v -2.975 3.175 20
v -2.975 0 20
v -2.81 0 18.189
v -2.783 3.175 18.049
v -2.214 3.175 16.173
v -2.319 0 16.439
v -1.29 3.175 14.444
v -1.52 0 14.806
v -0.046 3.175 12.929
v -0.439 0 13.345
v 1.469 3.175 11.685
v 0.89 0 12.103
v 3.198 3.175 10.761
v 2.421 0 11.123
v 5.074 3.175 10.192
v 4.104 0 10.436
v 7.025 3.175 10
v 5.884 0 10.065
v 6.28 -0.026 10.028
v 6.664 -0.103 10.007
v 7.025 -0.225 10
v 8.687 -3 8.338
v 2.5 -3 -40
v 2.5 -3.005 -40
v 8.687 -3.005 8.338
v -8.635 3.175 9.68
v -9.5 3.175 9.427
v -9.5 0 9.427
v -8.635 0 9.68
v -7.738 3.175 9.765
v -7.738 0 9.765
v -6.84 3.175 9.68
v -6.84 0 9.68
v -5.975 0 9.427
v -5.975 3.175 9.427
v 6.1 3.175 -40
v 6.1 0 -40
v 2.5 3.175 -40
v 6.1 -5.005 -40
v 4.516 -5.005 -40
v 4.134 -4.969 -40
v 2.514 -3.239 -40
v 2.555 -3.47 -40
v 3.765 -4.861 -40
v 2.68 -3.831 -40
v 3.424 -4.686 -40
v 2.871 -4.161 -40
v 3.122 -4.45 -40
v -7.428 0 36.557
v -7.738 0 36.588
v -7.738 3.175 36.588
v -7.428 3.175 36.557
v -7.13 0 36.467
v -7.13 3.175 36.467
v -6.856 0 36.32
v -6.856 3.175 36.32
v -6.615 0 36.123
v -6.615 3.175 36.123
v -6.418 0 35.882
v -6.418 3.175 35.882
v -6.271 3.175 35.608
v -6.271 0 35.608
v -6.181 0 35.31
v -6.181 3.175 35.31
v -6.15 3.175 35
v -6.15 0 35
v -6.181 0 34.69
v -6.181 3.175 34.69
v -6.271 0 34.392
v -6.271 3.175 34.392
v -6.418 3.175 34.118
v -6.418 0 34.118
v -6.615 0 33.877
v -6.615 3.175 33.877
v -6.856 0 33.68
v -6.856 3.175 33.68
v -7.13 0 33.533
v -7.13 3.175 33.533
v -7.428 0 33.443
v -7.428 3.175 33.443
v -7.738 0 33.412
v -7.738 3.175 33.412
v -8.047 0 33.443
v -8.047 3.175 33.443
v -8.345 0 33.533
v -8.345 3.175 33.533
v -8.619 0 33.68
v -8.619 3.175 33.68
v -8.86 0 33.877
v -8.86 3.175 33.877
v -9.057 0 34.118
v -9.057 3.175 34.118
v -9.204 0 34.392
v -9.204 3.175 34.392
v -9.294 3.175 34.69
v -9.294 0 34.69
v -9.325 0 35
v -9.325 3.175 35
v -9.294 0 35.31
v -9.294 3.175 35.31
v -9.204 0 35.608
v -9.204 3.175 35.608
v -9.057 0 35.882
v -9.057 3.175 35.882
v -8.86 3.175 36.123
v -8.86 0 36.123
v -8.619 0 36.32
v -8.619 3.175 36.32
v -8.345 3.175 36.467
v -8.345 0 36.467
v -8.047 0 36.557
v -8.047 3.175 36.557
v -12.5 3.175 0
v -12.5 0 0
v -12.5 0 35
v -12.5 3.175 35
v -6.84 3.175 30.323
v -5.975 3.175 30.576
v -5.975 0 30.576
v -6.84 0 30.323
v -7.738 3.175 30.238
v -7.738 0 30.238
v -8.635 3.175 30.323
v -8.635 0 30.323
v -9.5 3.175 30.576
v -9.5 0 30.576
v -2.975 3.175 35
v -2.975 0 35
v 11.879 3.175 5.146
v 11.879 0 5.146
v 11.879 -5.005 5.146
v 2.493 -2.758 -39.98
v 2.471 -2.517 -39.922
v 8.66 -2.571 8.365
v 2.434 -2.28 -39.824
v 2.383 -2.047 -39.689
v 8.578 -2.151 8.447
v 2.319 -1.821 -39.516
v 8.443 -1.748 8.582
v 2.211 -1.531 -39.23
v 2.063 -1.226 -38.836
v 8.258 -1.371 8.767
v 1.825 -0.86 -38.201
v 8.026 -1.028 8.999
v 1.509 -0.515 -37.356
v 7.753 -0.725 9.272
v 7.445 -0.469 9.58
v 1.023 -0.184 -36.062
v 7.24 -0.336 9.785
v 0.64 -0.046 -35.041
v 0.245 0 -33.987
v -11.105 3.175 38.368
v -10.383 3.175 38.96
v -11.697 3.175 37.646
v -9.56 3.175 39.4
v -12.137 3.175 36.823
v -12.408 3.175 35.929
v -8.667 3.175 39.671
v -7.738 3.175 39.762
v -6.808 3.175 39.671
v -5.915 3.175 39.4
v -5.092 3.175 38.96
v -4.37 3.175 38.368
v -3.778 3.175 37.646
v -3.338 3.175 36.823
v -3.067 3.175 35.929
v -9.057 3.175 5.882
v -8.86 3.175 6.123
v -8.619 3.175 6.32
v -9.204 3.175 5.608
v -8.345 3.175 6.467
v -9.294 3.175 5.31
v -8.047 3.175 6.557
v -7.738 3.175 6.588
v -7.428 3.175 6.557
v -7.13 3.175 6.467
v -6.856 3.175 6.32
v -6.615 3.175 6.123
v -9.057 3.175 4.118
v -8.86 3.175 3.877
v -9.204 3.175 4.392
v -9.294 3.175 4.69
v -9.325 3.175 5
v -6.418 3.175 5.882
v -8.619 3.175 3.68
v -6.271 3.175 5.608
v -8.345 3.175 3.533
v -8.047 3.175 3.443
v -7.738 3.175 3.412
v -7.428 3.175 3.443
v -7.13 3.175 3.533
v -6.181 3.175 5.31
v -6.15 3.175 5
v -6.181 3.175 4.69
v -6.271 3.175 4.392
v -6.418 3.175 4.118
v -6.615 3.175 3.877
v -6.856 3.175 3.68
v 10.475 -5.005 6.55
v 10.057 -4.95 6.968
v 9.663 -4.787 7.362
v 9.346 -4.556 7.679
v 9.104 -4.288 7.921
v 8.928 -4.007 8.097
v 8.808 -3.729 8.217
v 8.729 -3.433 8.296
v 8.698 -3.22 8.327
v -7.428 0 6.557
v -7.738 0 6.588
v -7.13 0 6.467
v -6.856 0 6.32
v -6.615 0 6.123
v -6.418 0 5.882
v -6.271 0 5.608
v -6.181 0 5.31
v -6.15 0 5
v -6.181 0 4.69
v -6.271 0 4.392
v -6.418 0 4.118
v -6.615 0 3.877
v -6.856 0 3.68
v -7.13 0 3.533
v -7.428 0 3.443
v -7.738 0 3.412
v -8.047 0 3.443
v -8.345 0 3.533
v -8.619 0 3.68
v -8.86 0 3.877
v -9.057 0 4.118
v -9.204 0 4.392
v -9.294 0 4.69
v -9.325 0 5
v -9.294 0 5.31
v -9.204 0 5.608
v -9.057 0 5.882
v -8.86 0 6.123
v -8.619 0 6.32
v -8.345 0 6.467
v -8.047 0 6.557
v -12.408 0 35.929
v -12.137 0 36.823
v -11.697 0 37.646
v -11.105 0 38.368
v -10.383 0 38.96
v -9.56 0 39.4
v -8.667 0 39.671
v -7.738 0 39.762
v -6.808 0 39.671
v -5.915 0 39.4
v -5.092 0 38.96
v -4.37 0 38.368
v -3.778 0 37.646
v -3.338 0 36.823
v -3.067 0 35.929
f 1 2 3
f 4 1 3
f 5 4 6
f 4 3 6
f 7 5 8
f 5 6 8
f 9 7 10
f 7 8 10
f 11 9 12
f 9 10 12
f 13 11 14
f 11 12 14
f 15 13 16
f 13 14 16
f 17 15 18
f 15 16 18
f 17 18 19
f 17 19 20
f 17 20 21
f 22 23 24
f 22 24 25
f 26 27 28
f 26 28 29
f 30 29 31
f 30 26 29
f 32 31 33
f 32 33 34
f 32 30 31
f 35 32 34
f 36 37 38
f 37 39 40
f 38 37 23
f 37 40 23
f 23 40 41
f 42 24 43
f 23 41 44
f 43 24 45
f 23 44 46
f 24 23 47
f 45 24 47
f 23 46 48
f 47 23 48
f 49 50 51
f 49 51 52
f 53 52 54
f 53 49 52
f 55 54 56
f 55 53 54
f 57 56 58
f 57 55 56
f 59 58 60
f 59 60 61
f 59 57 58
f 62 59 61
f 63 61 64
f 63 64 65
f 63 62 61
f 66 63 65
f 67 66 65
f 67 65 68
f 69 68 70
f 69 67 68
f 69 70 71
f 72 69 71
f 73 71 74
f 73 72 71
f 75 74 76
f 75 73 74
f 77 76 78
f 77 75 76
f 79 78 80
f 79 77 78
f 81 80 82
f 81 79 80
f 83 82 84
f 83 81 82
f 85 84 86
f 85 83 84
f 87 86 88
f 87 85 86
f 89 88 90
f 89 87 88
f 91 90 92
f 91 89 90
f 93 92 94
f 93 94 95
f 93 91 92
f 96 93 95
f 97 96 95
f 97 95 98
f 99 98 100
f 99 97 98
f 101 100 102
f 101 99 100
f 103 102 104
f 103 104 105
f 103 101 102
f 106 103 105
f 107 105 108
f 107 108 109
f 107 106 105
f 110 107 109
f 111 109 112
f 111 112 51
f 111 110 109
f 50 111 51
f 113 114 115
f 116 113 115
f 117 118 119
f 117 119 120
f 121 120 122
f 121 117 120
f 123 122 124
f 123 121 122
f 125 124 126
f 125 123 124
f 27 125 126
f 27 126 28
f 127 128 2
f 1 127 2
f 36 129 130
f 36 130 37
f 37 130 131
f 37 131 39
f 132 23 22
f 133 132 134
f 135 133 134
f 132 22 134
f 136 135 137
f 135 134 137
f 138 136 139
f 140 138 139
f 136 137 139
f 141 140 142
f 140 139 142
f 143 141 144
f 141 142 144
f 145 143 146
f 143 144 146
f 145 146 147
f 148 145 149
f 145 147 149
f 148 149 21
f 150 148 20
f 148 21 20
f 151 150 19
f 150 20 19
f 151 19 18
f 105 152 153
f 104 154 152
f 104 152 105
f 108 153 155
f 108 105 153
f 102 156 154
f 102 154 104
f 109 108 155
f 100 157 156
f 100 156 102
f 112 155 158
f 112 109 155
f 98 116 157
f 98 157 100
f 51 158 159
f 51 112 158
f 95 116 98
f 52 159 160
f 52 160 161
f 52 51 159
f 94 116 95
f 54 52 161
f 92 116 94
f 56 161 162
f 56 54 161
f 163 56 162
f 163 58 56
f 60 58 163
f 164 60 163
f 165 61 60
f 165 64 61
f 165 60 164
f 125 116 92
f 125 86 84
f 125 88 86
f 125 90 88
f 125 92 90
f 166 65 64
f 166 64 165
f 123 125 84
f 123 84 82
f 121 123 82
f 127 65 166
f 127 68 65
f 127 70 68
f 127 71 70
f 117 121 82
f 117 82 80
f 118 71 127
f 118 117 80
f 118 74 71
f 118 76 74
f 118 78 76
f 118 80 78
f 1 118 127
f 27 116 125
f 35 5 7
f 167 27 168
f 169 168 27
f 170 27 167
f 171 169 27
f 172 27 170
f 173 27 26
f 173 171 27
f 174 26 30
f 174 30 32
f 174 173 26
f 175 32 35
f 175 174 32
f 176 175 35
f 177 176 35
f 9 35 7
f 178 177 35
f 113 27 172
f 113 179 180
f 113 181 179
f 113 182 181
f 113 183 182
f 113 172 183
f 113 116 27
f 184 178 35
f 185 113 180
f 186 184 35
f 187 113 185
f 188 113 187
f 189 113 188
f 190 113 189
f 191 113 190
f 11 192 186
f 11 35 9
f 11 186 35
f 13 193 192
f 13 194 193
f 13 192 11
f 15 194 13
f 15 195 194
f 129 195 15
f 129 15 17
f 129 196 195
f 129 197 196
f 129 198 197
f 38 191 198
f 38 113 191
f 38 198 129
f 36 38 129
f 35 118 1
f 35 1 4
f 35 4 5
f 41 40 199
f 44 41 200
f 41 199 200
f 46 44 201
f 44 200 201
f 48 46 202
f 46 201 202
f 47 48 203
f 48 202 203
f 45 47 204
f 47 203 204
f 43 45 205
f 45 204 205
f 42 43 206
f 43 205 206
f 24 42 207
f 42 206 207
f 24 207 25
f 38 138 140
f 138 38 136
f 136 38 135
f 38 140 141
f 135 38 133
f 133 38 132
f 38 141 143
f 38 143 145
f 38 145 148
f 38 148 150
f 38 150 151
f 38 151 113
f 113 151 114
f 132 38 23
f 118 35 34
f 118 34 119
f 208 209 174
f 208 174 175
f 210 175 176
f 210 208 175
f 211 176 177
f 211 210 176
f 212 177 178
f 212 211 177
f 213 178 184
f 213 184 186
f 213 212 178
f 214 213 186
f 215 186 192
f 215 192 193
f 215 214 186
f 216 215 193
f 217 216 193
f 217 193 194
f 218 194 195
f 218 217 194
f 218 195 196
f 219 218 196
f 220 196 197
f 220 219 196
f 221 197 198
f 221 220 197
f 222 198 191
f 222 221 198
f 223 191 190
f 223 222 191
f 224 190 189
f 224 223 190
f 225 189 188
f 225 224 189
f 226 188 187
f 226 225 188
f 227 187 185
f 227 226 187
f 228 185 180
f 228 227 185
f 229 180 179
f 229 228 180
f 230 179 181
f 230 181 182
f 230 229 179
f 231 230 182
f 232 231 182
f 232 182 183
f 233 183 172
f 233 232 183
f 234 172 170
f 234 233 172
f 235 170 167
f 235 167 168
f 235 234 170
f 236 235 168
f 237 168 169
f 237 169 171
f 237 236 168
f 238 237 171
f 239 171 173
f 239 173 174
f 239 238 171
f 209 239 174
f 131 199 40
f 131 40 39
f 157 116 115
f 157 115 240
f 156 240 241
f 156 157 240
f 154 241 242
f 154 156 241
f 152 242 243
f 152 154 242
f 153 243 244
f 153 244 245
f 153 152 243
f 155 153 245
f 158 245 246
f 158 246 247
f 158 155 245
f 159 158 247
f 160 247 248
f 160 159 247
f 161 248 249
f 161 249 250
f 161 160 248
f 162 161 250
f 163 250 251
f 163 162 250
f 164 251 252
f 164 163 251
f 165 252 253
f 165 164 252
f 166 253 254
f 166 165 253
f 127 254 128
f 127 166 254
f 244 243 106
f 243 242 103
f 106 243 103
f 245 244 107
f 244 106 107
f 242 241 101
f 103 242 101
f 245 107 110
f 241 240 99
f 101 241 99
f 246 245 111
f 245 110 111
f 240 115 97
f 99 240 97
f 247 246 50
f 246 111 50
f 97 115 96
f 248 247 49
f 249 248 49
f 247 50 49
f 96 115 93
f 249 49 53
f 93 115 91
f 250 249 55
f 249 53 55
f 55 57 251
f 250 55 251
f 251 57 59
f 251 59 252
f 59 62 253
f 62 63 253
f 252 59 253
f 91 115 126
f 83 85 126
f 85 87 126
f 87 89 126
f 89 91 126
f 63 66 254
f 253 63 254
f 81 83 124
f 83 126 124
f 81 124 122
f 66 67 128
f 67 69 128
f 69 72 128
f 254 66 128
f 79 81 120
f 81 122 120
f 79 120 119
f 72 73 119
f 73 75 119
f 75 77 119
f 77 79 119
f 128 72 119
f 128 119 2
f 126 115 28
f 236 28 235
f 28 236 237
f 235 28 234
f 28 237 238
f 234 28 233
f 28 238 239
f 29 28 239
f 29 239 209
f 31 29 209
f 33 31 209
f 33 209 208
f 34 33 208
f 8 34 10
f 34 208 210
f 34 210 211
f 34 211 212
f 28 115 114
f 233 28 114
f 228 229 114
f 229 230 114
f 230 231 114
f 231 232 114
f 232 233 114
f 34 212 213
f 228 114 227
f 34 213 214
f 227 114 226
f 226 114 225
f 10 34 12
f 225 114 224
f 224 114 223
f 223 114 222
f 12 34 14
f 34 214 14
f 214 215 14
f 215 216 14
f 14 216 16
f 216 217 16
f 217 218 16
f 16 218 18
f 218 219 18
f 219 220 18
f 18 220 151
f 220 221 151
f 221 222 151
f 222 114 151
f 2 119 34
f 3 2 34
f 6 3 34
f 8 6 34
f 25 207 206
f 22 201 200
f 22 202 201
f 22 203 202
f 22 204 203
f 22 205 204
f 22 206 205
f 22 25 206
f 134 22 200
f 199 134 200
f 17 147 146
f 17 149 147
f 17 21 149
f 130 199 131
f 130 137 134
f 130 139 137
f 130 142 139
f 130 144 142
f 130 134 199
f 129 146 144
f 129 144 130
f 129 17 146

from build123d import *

# Parameters (mm, degrees)
CROQUIS1_R              = 1.5875
SALIENTE_EXTRUIR1_DEPTH = 3.175
CORTAR_EXTRUIR1_DEPTH   = 3.175
CORTAR_EXTRUIR3_DEPTH   = 10
CORTAR_EXTRUIR4_DEPTH   = 10
BOSS_EXTRU_1_DEPTH      = 8.18
CONG_1_R                = 2
CONG_2_R                = 3


with BuildPart() as part:
    # Croquis1 → Saliente-Extruir1 (new body)
    with BuildSketch(Plane(origin=(0, 0, 0), x_dir=(1, 0, 0), z_dir=(0, 1, 0))):
        with BuildLine():
            Line((-12.5, 0), (-12.5, -40))
            Line((-12.5, -40), (-2.975, -40))
            Line((-2.975, -40), (-2.975, -20))
            ThreePointArc((-2.975, -20), (-0.046067812, -12.928932188), (7.025, -10))
            Line((7.025, -10), (12.5, -10))
            Line((12.5, -10), (12.5, 40))
            Line((12.5, 40), (2.5, 40))
            Line((2.5, 40), (-12.5, 0))
        make_face()
        with Locations(Location((-7.7375, -5, 0), (0, 0, 270))):
            Circle(CROQUIS1_R, mode=Mode.SUBTRACT)
        with Locations(Location((-7.7375, -35, 0), (0, 0, 270))):
            Circle(CROQUIS1_R, mode=Mode.SUBTRACT)
    extrude(amount=SALIENTE_EXTRUIR1_DEPTH)

    # Croquis2 → Cortar-Extruir1 (cut)
    with BuildSketch(Plane(origin=(0, 3.175, 0), x_dir=(1, 0, 0), z_dir=(0, 1, 0))):
        Polygon((12.5, -10), (6.1, 40), (12.5, 40), align=None)
    extrude(amount=-CORTAR_EXTRUIR1_DEPTH, mode=Mode.SUBTRACT)

    # Croquis3 → Cortar-Extruir3 (cut)
    with BuildSketch(Plane(origin=(0, 3.175, 0), x_dir=(1, 0, 0), z_dir=(0, 1, 0))):
        with BuildLine():
            ThreePointArc((-5.975, -30.575635639), (-7.7375, -30.2375), (-9.5, -30.575635639))
            Line((-9.5, -30.575635639), (-9.5, -9.427055314))
            ThreePointArc((-9.5, -9.427055314), (-7.7375, -9.765), (-5.975, -9.427055314))
            Line((-5.975, -9.427055314), (-5.975, -14.803847577))
            Line((-5.975, -14.803847577), (-5.975, -30.575635639))
        make_face()
        with BuildLine():
            ThreePointArc((-12.5, -35), (-7.7375, -39.7625), (-2.975, -35))
            Line((-2.975, -35), (-2.975, -40))
            Line((-2.975, -40), (-12.5, -40))
            Line((-12.5, -40), (-12.5, -35))
        make_face()
    extrude(amount=-CORTAR_EXTRUIR3_DEPTH, mode=Mode.SUBTRACT)

    # Croquis4 → Cortar-Extruir4 (cut)
    with BuildSketch(Plane(origin=(0, 3.175, 0), x_dir=(1, 0, 0), z_dir=(0, 1, 0))):
        Polygon((7.025, -10), (11.878723404, -5.146276596), (12.5, -10), align=None)
    extrude(amount=-CORTAR_EXTRUIR4_DEPTH, mode=Mode.SUBTRACT)

    # Esquisse1 → Boss.-Extru.1 (add)
    with BuildSketch(Plane(origin=(0, 3.175, 0), x_dir=(1, 0, 0), z_dir=(0, 1, 0))):
        Polygon((11.878723404, -5.146276596), (6.1, 40), (2.5, 40), (8.687234043, -8.337765957), align=None)
    extrude(amount=-BOSS_EXTRU_1_DEPTH)

    # Congé1
    cong_1_edges = [part.edges().sort_by_distance(p)[0] for p in [
        (5.593617021, -5.005, -15.831117021),
    ]]
    fillet(cong_1_edges, radius=CONG_1_R)

    # Congé2
    cong_2_edges = [part.edges().sort_by_distance(p)[0] for p in [
        (5.593617021, 0, -15.831117021),
    ]]
    fillet(cong_2_edges, radius=CONG_2_R)


solid = part.part
